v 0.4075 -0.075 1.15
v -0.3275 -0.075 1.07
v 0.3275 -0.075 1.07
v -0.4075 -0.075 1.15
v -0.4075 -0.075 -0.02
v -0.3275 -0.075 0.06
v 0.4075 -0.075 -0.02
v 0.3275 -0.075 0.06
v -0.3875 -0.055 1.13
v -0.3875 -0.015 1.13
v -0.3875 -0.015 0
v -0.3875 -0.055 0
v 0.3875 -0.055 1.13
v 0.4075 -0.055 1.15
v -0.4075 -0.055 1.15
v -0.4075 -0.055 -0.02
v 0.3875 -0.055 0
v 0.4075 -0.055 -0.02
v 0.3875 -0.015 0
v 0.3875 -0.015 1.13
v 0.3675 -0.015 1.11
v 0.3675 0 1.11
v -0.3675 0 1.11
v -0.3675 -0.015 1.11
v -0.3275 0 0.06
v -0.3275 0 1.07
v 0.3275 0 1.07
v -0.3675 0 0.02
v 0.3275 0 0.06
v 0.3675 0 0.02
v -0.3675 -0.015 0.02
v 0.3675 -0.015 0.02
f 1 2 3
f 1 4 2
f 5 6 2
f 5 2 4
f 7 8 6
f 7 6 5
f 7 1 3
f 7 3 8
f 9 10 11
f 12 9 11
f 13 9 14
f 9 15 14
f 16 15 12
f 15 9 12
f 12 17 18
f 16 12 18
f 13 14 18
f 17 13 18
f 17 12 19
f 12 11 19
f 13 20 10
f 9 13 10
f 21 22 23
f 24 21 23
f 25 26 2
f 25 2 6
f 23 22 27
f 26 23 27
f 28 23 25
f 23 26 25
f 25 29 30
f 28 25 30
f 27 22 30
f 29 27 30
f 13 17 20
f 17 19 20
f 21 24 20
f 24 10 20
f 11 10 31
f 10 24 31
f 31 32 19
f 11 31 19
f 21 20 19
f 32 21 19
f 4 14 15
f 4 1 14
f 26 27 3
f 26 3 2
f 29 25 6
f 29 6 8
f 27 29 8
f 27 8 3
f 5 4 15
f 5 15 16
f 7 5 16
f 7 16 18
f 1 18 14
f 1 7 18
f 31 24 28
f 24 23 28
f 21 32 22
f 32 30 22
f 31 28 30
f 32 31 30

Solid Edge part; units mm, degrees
sketch "Sketch1" plane through (0, 0, 0) normal (0, -1, 0) x (1, 0, 0)
  line L0 (-0.3875, 0) -> (0.3875, 0)
  line L1 (0.3875, 0) -> (0.3875, 1.13)
  line L2 (0.3875, 1.13) -> (-0.3875, 1.13)
  line L3 (-0.3875, 1.13) -> (-0.3875, 0)
  dimension "D1" = 1.13
  dimension "D2" = 0.775
extrude "Protrusion1" add sketch "Sketch1" along normal blind 0.075
sketch "Sketch2" plane through (0, 0, 0.69) normal (0, 1, 0) x (-1, 0, 0)
  line L0 (-0.3275, 0.38) -> (0.3275, 0.38)
  line L1 (0.3275, 0.38) -> (0.3275, -0.63)
  line L2 (0.3275, -0.63) -> (-0.3275, -0.63)
  line L3 (-0.3275, -0.63) -> (-0.3275, 0.38)
extrude "Cutout1" cut sketch "Sketch2" against normal up to next
sketch "Sketch3" plane through (0, 0, 0.69) normal (0, 1, 0) x (-1, 0, 0)
  line L0 (-0.3675, -0.67) -> (-0.3675, 0.42)
  line L1 (-0.3675, 0.42) -> (0.3675, 0.42)
  line L2 (0.3675, 0.42) -> (0.3675, -0.67)
  line L3 (0.3675, -0.67) -> (-0.3675, -0.67)
  line L4 (-0.3875, -0.69) -> (-0.3875, 0.44)
  line L5 (-0.3875, 0.44) -> (0.3875, 0.44)
  line L6 (0.3875, 0.44) -> (0.3875, -0.69)
  line L7 (0.3875, -0.69) -> (-0.3875, -0.69)
extrude "Ausschnitt_1" cut sketch "Sketch3" against normal blind 0.015
sketch "Sketch4" plane through (0, -0.075, 0.69) normal (0, -1, 0) x (1, 0, 0)
  line L0 (-0.4075, 0.46) -> (-0.4075, -0.71)
  line L1 (-0.4075, -0.71) -> (0.4075, -0.71)
  line L2 (0.4075, -0.71) -> (0.4075, 0.46)
  line L3 (0.4075, 0.46) -> (-0.4075, 0.46)
  line L4 (0.3875, 0.44) -> (-0.3875, 0.44)
  line L5 (-0.3875, 0.44) -> (-0.3875, -0.69)
  line L6 (-0.3875, -0.69) -> (0.3875, -0.69)
  line L7 (0.3875, -0.69) -> (0.3875, 0.44)
extrude "Ausprägung_2" add sketch "Sketch4" against normal blind 0.02
